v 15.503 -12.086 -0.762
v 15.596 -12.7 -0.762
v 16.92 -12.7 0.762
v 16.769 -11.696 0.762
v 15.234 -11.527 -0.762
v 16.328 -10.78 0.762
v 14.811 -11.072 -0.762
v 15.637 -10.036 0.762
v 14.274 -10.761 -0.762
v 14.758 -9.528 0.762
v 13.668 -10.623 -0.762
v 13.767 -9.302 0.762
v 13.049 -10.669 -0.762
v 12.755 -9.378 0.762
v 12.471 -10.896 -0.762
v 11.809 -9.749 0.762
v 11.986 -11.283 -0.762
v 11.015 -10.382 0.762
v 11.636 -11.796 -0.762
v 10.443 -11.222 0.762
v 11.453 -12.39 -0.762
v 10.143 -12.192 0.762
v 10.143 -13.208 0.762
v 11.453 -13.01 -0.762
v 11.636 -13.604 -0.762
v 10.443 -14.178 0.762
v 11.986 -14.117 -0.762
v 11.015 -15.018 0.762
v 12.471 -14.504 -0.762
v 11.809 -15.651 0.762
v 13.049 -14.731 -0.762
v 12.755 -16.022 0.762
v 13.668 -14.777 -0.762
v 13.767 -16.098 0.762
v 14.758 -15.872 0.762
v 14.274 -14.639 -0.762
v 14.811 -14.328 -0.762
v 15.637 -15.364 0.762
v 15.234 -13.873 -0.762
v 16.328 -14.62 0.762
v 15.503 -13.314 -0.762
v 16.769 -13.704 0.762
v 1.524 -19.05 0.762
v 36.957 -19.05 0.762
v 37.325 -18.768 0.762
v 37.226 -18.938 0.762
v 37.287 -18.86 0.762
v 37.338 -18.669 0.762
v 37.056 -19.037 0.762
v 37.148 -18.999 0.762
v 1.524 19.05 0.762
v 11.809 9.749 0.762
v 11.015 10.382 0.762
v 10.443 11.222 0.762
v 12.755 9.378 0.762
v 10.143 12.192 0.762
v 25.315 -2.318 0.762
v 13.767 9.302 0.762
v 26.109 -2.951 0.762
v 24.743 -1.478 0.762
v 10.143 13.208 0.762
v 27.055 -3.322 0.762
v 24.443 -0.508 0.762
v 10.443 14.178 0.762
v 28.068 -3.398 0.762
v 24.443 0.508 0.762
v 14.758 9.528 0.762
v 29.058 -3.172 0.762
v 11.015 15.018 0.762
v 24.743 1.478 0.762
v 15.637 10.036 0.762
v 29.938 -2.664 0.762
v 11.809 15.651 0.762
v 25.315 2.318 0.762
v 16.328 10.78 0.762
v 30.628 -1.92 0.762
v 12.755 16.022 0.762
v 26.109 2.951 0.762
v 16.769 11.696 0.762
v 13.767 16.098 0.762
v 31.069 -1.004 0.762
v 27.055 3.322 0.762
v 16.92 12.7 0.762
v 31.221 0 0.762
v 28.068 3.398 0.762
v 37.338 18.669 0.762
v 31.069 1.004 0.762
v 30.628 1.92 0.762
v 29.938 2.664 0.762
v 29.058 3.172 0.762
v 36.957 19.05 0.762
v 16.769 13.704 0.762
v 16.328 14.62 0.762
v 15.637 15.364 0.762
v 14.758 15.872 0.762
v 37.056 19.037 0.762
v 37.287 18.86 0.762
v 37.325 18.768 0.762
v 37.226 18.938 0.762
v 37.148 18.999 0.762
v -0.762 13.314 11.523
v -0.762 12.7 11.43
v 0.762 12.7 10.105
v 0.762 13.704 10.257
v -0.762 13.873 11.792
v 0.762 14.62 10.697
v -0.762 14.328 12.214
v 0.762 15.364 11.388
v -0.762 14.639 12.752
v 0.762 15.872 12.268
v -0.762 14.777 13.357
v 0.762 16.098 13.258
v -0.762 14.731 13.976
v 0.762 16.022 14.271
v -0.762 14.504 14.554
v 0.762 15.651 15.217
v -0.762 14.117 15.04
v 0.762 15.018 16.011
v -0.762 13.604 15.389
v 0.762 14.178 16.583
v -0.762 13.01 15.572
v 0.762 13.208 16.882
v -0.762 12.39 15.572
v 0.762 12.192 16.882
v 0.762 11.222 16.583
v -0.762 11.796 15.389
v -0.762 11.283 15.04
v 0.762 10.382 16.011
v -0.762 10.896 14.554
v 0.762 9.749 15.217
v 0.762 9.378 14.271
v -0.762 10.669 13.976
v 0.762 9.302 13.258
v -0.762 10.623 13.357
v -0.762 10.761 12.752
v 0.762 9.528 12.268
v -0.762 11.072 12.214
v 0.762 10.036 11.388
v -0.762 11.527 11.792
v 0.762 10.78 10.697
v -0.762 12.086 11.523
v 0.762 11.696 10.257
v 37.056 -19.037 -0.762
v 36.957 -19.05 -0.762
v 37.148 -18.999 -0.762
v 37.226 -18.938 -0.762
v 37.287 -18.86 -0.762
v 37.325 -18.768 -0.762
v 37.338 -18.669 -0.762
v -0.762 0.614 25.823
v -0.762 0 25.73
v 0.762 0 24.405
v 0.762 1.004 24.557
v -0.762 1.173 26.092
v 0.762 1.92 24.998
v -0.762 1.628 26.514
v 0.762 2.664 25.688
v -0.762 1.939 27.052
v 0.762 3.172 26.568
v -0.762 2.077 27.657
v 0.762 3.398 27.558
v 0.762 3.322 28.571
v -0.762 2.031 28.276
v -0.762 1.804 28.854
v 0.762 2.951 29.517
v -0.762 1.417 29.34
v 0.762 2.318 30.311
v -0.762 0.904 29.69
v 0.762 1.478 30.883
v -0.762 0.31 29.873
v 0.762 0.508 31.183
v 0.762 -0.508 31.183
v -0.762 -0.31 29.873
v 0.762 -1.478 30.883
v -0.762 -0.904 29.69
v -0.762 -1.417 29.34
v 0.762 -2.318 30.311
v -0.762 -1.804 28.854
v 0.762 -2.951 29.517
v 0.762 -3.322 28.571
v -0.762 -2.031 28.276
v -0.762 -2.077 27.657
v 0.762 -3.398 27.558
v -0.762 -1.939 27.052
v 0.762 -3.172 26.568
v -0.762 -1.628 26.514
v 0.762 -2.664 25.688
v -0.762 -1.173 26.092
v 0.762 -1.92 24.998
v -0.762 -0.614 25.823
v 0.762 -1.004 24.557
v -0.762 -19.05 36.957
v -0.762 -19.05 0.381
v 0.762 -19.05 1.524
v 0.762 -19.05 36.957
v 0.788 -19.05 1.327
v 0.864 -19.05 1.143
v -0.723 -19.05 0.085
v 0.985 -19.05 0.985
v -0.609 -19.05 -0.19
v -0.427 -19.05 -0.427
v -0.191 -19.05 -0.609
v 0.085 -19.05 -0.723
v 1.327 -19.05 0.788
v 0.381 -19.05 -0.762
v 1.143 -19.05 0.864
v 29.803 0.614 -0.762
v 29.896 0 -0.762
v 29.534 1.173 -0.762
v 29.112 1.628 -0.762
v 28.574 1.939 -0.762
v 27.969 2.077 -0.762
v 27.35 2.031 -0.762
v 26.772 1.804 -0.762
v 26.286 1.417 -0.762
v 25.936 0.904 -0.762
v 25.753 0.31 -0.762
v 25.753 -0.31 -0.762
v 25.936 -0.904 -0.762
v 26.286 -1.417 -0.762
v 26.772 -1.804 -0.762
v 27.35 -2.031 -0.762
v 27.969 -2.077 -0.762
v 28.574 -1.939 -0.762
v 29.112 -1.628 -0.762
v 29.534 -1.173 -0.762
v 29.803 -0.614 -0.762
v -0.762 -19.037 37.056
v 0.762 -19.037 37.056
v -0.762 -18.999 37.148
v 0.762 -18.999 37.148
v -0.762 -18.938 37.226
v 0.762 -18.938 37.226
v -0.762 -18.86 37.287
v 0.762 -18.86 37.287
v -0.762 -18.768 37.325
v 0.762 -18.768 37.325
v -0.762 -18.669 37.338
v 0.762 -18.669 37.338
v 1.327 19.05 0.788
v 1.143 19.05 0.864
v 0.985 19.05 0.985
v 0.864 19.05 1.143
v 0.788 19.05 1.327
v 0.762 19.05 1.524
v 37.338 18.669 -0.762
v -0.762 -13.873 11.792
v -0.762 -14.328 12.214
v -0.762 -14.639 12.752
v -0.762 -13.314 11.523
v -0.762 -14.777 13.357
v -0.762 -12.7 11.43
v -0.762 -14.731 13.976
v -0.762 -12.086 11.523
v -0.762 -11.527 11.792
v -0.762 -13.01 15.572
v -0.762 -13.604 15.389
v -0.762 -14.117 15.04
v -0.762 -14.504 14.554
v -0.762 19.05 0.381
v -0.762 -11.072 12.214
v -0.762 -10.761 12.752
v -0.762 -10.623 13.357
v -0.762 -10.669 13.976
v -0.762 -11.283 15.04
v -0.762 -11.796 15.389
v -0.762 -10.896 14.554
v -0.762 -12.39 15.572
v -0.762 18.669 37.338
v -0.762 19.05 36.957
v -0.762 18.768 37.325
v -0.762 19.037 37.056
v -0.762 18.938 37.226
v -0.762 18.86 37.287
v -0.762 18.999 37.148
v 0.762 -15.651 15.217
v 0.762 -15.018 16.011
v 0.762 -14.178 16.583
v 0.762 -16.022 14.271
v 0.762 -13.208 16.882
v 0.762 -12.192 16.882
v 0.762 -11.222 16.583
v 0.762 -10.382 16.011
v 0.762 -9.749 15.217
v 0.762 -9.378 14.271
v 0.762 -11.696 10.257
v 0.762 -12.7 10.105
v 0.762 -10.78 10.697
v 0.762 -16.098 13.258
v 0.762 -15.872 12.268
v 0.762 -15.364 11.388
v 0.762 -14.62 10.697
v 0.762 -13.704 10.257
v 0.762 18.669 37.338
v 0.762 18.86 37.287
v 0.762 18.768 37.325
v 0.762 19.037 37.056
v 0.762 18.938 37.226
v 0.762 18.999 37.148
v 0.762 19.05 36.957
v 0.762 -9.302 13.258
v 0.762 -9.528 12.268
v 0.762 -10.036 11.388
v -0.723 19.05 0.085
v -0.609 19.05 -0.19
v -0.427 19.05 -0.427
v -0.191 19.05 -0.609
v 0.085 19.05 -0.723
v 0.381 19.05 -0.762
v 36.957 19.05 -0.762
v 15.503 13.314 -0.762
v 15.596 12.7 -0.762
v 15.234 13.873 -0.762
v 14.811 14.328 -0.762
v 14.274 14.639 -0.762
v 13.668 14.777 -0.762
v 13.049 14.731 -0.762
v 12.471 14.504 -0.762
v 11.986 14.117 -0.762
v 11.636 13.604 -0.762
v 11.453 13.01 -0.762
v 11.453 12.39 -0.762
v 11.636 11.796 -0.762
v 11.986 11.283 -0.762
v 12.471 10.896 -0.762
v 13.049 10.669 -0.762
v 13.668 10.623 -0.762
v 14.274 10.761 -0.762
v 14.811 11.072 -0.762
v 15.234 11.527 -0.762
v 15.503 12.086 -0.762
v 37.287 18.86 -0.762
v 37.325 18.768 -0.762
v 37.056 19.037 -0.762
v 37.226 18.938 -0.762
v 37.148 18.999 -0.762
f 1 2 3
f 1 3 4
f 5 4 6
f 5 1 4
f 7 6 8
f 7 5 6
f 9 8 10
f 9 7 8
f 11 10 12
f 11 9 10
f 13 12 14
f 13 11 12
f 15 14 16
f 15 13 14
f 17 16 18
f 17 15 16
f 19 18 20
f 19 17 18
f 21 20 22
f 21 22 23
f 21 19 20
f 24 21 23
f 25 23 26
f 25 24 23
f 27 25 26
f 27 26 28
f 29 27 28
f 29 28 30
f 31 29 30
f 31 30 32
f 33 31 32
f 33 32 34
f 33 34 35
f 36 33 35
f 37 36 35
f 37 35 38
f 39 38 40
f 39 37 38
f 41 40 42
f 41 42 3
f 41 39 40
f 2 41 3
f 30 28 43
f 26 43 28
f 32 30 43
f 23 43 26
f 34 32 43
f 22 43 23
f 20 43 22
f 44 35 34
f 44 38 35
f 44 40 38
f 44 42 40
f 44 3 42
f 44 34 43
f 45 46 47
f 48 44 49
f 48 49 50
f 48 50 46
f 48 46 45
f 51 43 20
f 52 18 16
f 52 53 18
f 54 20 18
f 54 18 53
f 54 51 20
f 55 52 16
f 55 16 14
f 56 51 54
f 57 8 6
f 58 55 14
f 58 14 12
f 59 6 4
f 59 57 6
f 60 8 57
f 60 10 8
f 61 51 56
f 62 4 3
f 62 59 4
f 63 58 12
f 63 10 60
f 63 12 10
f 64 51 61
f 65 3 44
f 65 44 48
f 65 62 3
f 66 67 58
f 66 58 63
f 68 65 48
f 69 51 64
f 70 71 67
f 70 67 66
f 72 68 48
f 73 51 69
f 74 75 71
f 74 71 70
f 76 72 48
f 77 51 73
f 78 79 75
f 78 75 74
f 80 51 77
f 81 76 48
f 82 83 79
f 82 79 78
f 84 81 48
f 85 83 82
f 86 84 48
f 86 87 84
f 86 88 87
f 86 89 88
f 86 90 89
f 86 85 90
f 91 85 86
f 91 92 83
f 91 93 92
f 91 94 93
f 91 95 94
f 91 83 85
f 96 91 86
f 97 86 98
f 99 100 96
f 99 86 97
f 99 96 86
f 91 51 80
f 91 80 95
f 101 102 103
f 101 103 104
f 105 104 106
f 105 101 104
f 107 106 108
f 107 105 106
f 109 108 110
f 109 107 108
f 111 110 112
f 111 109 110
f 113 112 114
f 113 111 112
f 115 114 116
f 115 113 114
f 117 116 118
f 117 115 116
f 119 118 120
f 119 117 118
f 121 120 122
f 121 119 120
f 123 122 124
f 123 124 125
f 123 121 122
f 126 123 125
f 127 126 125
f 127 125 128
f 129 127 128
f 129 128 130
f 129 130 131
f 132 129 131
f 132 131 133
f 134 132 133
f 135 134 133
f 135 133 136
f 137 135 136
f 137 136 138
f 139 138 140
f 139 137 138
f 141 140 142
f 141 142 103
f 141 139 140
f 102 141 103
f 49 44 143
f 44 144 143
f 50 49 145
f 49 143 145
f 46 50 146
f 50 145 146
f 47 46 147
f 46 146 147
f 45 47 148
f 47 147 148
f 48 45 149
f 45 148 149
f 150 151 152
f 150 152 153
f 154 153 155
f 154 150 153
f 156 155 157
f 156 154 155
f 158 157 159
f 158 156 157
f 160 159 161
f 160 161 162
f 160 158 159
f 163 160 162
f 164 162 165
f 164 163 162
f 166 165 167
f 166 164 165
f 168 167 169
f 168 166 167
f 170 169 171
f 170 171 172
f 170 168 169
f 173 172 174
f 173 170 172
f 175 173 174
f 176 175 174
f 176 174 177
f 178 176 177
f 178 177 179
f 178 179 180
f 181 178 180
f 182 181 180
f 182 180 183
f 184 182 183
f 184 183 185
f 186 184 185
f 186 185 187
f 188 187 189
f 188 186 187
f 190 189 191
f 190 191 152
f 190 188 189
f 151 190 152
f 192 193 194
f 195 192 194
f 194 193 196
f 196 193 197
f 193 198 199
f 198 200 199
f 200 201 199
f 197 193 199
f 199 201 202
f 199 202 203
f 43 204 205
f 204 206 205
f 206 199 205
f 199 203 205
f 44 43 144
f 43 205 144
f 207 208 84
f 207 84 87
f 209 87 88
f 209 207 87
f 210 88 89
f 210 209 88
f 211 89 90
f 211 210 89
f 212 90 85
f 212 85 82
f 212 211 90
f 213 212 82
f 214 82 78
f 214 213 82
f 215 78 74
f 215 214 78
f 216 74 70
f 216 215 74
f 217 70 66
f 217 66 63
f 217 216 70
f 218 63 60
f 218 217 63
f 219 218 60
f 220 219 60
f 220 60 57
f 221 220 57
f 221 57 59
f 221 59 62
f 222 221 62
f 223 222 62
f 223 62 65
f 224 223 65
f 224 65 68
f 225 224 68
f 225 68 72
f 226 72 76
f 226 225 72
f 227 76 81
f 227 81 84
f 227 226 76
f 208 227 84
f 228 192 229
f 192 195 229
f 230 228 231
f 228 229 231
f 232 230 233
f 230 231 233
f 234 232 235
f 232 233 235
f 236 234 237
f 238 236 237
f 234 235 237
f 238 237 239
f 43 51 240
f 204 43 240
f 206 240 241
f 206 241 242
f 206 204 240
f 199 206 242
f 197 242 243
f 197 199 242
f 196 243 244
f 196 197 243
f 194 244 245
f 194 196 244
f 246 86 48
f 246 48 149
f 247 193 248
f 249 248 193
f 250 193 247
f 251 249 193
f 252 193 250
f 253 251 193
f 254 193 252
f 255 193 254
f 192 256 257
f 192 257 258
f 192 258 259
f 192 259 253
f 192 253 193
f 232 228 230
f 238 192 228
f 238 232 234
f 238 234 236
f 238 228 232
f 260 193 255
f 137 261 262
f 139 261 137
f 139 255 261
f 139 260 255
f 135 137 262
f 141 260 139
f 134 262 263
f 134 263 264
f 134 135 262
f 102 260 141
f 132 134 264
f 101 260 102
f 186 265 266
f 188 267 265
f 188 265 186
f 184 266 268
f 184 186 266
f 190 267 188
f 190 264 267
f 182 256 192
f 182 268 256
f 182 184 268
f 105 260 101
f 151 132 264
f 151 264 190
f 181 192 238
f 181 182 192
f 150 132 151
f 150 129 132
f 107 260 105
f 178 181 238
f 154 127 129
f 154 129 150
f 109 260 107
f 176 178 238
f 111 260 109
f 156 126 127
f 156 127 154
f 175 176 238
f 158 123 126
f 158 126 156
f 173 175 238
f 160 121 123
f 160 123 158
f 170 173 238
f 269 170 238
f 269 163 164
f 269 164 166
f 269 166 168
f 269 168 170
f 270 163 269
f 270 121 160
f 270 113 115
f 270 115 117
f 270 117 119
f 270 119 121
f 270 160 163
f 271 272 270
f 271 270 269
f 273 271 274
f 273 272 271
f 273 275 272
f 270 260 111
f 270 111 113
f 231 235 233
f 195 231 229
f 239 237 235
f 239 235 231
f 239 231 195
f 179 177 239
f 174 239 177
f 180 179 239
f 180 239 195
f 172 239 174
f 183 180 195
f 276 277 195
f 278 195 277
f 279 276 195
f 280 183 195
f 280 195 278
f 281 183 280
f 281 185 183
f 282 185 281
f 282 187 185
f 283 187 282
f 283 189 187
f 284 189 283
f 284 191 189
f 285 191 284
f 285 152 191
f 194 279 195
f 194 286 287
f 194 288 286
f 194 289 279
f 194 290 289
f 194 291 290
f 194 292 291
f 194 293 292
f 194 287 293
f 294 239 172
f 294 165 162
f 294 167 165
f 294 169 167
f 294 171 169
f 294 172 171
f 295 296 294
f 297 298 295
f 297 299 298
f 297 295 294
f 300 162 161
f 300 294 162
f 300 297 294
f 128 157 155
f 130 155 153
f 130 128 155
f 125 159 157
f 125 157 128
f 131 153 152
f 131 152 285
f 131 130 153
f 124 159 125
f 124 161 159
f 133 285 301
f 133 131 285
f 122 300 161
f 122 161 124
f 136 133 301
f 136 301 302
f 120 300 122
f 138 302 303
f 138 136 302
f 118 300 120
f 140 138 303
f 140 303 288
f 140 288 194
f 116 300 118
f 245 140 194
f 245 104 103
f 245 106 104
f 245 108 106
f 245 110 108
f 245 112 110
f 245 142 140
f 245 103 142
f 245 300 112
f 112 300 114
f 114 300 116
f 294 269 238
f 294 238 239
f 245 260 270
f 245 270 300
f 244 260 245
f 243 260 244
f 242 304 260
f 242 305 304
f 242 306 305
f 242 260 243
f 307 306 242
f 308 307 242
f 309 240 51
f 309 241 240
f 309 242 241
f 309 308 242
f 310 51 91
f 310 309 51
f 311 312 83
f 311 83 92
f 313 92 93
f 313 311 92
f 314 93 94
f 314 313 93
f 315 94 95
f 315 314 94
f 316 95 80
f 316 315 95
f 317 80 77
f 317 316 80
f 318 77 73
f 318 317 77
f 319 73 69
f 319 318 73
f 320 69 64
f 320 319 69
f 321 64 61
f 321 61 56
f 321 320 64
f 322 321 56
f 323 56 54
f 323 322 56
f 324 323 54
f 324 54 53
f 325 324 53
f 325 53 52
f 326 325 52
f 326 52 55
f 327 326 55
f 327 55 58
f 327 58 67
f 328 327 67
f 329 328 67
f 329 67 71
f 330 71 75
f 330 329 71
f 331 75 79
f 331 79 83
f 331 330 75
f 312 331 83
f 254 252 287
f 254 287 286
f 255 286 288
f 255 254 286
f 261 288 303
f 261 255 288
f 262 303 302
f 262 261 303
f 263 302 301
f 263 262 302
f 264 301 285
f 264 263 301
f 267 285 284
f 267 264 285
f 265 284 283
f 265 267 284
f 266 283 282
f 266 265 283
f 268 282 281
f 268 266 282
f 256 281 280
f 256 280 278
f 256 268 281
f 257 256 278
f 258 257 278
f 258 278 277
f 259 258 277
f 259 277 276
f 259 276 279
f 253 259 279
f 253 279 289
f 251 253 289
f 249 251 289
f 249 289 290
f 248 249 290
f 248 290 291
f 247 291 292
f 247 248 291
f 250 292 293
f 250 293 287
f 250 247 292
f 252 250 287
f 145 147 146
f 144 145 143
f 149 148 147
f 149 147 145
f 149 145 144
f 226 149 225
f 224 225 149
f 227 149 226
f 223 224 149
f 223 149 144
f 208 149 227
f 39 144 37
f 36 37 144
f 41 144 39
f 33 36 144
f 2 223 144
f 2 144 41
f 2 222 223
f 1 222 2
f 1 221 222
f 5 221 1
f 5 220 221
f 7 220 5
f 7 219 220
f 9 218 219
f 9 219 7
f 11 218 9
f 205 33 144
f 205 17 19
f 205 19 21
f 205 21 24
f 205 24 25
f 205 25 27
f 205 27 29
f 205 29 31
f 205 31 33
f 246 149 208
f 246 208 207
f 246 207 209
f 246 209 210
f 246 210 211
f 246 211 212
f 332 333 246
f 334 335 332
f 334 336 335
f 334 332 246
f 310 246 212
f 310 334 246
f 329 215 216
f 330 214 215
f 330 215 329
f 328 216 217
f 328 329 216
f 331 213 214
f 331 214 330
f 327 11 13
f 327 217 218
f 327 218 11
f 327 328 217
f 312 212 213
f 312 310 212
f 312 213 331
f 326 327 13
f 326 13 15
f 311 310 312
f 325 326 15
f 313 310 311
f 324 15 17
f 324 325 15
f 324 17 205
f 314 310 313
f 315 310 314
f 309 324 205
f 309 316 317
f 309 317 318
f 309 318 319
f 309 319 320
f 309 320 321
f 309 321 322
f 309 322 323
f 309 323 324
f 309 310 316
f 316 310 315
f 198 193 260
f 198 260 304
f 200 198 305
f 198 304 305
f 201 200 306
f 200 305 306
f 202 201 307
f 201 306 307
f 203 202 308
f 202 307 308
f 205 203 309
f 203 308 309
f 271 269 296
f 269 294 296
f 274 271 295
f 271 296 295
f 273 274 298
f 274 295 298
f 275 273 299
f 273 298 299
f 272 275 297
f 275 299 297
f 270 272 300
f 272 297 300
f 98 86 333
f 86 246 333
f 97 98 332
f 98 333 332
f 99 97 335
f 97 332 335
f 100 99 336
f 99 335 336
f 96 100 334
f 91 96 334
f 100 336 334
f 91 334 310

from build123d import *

# Parameters (mm, degrees)
BOSS_EXTRUDE1_DEPTH          = 19.05
FILLET1_R                    = 1.143
FILLET2_R                    = 0.762
FILLET3_R                    = 0.381
SKETCH4_R                    = 2.0828
CUT_EXTRUDE1_DEPTH           = 1.524
CUT_EXTRUDE1_DRAFT           = -41
CUT_EXTRUDE1_PROFILE_2_DEPTH = 1.524
CUT_EXTRUDE1_PROFILE_2_DRAFT = -41
CUT_EXTRUDE1_PROFILE_3_DEPTH = 1.524
CUT_EXTRUDE1_PROFILE_3_DRAFT = -41
SKETCH5_R                    = 2.0828
CUT_EXTRUDE2_DEPTH           = 1.524
CUT_EXTRUDE2_DRAFT           = -41
CUT_EXTRUDE2_PROFILE_2_DEPTH = 1.524
CUT_EXTRUDE2_PROFILE_2_DRAFT = -41
CUT_EXTRUDE2_PROFILE_3_DEPTH = 1.524
CUT_EXTRUDE2_PROFILE_3_DRAFT = -41


with BuildPart() as part:
    # Sketch3 → Boss-Extrude1 (new, symmetric)
    with BuildSketch(Plane(origin=(0, 0, 0), x_dir=(1, 0, 0), z_dir=(0, 1, 0))):
        Polygon((0.762, -0.762), (37.338, -0.762), (37.338, 0.762), (-0.762, 0.762), (-0.762, -37.338), (0.762, -37.338), align=None)
    extrude(amount=BOSS_EXTRUDE1_DEPTH, both=True)

    # Fillet1
    fillet1_edges = [part.edges().sort_by_distance(p)[0] for p in [
        (-0.762, 0, -0.762),
    ]]
    fillet(fillet1_edges, radius=FILLET1_R)

    # Fillet2
    fillet2_edges = [part.edges().sort_by_distance(p)[0] for p in [
        (0.762, 0, 0.762),
    ]]
    fillet(fillet2_edges, radius=FILLET2_R)

    # Fillet3
    fillet3_edges = [part.edges().sort_by_distance(p)[0] for p in [
        (37.338, 19.05, 0),
        (0, 19.05, 37.338),
        (0, -19.05, 37.338),
        (37.338, -19.05, 0),
    ]]
    fillet(fillet3_edges, radius=FILLET3_R)


with BuildPart() as cut_extrude1_tool:
    # Sketch4 → Cut-Extrude1 (with draft: the straight prism first)
    with BuildSketch(Plane(origin=(-0.762, 0, 0), x_dir=(0, 0, -1), z_dir=(1, 0, 0))):
        with Locations((-27.813, 0)):
            Circle(SKETCH4_R)
    extrude(amount=CUT_EXTRUDE1_DEPTH)
    # Cut-Extrude1: the draft: its side faces are tilted about the plane it starts from
    cut_extrude1_sides = [cut_extrude1_tool.faces().sort_by_distance(p)[0] for p in [
        (0, 0, 29.8958),
    ]]
    draft(cut_extrude1_sides, Plane(origin=(-0.762, 0, 0), x_dir=(0, 0, -1), z_dir=(1, 0, 0)), CUT_EXTRUDE1_DRAFT)


with BuildPart() as part_1:
    add(part.part)

    # Cut-Extrude1: cut by cut_extrude1_tool
    add(cut_extrude1_tool.part, mode=Mode.SUBTRACT)


with BuildPart() as cut_extrude1_profile_2_tool:
    # Sketch4 → Cut-Extrude1 profile 2 (with draft: the straight prism first)
    with BuildSketch(Plane(origin=(-0.762, 0, 0), x_dir=(0, 0, -1), z_dir=(1, 0, 0))):
        with Locations((-13.5128, 12.7)):
            Circle(SKETCH4_R)
    extrude(amount=CUT_EXTRUDE1_PROFILE_2_DEPTH)
    # Cut-Extrude1 profile 2: the draft: its side faces are tilted about the plane it starts from
    cut_extrude1_profile_2_sides = [cut_extrude1_profile_2_tool.faces().sort_by_distance(p)[0] for p in [
        (0, 12.7, 15.5956),
    ]]
    draft(cut_extrude1_profile_2_sides, Plane(origin=(-0.762, 0, 0), x_dir=(0, 0, -1), z_dir=(1, 0, 0)), CUT_EXTRUDE1_PROFILE_2_DRAFT)


with BuildPart() as part_2:
    add(part_1.part)

    # Cut-Extrude1 profile 2: cut by cut_extrude1_profile_2_tool
    add(cut_extrude1_profile_2_tool.part, mode=Mode.SUBTRACT)


with BuildPart() as cut_extrude1_profile_3_tool:
    # Sketch4 → Cut-Extrude1 profile 3 (with draft: the straight prism first)
    with BuildSketch(Plane(origin=(-0.762, 0, 0), x_dir=(0, 0, -1), z_dir=(1, 0, 0))):
        with Locations((-13.5128, -12.7)):
            Circle(SKETCH4_R)
    extrude(amount=CUT_EXTRUDE1_PROFILE_3_DEPTH)
    # Cut-Extrude1 profile 3: the draft: its side faces are tilted about the plane it starts from
    cut_extrude1_profile_3_sides = [cut_extrude1_profile_3_tool.faces().sort_by_distance(p)[0] for p in [
        (0, -12.7, 15.5956),
    ]]
    draft(cut_extrude1_profile_3_sides, Plane(origin=(-0.762, 0, 0), x_dir=(0, 0, -1), z_dir=(1, 0, 0)), CUT_EXTRUDE1_PROFILE_3_DRAFT)


with BuildPart() as part_3:
    add(part_2.part)

    # Cut-Extrude1 profile 3: cut by cut_extrude1_profile_3_tool
    add(cut_extrude1_profile_3_tool.part, mode=Mode.SUBTRACT)


with BuildPart() as cut_extrude2_tool:
    # Sketch5 → Cut-Extrude2 (with draft: the straight prism first)
    with BuildSketch(Plane.XY.offset(-0.762)):
        with Locations((13.5128, 12.7)):
            Circle(SKETCH5_R)
    extrude(amount=CUT_EXTRUDE2_DEPTH)
    # Cut-Extrude2: the draft: its side faces are tilted about the plane it starts from
    cut_extrude2_sides = [cut_extrude2_tool.faces().sort_by_distance(p)[0] for p in [
        (11.43, 12.7, 0),
    ]]
    draft(cut_extrude2_sides, Plane.XY.offset(-0.762), CUT_EXTRUDE2_DRAFT)


with BuildPart() as part_4:
    add(part_3.part)

    # Cut-Extrude2: cut by cut_extrude2_tool
    add(cut_extrude2_tool.part, mode=Mode.SUBTRACT)


with BuildPart() as cut_extrude2_profile_2_tool:
    # Sketch5 → Cut-Extrude2 profile 2 (with draft: the straight prism first)
    with BuildSketch(Plane.XY.offset(-0.762)):
        with Locations((13.5128, -12.7)):
            Circle(SKETCH5_R)
    extrude(amount=CUT_EXTRUDE2_PROFILE_2_DEPTH)
    # Cut-Extrude2 profile 2: the draft: its side faces are tilted about the plane it starts from
    cut_extrude2_profile_2_sides = [cut_extrude2_profile_2_tool.faces().sort_by_distance(p)[0] for p in [
        (11.43, -12.7, 0),
    ]]
    draft(cut_extrude2_profile_2_sides, Plane.XY.offset(-0.762), CUT_EXTRUDE2_PROFILE_2_DRAFT)


with BuildPart() as part_5:
    add(part_4.part)

    # Cut-Extrude2 profile 2: cut by cut_extrude2_profile_2_tool
    add(cut_extrude2_profile_2_tool.part, mode=Mode.SUBTRACT)


with BuildPart() as cut_extrude2_profile_3_tool:
    # Sketch5 → Cut-Extrude2 profile 3 (with draft: the straight prism first)
    with BuildSketch(Plane.XY.offset(-0.762)):
        with Locations((27.813, 0)):
            Circle(SKETCH5_R)
    extrude(amount=CUT_EXTRUDE2_PROFILE_3_DEPTH)
    # Cut-Extrude2 profile 3: the draft: its side faces are tilted about the plane it starts from
    cut_extrude2_profile_3_sides = [cut_extrude2_profile_3_tool.faces().sort_by_distance(p)[0] for p in [
        (25.7302, 0, 0),
    ]]
    draft(cut_extrude2_profile_3_sides, Plane.XY.offset(-0.762), CUT_EXTRUDE2_PROFILE_3_DRAFT)


with BuildPart() as part_6:
    add(part_5.part)

    # Cut-Extrude2 profile 3: cut by cut_extrude2_profile_3_tool
    add(cut_extrude2_profile_3_tool.part, mode=Mode.SUBTRACT)


solid = part_6.part
